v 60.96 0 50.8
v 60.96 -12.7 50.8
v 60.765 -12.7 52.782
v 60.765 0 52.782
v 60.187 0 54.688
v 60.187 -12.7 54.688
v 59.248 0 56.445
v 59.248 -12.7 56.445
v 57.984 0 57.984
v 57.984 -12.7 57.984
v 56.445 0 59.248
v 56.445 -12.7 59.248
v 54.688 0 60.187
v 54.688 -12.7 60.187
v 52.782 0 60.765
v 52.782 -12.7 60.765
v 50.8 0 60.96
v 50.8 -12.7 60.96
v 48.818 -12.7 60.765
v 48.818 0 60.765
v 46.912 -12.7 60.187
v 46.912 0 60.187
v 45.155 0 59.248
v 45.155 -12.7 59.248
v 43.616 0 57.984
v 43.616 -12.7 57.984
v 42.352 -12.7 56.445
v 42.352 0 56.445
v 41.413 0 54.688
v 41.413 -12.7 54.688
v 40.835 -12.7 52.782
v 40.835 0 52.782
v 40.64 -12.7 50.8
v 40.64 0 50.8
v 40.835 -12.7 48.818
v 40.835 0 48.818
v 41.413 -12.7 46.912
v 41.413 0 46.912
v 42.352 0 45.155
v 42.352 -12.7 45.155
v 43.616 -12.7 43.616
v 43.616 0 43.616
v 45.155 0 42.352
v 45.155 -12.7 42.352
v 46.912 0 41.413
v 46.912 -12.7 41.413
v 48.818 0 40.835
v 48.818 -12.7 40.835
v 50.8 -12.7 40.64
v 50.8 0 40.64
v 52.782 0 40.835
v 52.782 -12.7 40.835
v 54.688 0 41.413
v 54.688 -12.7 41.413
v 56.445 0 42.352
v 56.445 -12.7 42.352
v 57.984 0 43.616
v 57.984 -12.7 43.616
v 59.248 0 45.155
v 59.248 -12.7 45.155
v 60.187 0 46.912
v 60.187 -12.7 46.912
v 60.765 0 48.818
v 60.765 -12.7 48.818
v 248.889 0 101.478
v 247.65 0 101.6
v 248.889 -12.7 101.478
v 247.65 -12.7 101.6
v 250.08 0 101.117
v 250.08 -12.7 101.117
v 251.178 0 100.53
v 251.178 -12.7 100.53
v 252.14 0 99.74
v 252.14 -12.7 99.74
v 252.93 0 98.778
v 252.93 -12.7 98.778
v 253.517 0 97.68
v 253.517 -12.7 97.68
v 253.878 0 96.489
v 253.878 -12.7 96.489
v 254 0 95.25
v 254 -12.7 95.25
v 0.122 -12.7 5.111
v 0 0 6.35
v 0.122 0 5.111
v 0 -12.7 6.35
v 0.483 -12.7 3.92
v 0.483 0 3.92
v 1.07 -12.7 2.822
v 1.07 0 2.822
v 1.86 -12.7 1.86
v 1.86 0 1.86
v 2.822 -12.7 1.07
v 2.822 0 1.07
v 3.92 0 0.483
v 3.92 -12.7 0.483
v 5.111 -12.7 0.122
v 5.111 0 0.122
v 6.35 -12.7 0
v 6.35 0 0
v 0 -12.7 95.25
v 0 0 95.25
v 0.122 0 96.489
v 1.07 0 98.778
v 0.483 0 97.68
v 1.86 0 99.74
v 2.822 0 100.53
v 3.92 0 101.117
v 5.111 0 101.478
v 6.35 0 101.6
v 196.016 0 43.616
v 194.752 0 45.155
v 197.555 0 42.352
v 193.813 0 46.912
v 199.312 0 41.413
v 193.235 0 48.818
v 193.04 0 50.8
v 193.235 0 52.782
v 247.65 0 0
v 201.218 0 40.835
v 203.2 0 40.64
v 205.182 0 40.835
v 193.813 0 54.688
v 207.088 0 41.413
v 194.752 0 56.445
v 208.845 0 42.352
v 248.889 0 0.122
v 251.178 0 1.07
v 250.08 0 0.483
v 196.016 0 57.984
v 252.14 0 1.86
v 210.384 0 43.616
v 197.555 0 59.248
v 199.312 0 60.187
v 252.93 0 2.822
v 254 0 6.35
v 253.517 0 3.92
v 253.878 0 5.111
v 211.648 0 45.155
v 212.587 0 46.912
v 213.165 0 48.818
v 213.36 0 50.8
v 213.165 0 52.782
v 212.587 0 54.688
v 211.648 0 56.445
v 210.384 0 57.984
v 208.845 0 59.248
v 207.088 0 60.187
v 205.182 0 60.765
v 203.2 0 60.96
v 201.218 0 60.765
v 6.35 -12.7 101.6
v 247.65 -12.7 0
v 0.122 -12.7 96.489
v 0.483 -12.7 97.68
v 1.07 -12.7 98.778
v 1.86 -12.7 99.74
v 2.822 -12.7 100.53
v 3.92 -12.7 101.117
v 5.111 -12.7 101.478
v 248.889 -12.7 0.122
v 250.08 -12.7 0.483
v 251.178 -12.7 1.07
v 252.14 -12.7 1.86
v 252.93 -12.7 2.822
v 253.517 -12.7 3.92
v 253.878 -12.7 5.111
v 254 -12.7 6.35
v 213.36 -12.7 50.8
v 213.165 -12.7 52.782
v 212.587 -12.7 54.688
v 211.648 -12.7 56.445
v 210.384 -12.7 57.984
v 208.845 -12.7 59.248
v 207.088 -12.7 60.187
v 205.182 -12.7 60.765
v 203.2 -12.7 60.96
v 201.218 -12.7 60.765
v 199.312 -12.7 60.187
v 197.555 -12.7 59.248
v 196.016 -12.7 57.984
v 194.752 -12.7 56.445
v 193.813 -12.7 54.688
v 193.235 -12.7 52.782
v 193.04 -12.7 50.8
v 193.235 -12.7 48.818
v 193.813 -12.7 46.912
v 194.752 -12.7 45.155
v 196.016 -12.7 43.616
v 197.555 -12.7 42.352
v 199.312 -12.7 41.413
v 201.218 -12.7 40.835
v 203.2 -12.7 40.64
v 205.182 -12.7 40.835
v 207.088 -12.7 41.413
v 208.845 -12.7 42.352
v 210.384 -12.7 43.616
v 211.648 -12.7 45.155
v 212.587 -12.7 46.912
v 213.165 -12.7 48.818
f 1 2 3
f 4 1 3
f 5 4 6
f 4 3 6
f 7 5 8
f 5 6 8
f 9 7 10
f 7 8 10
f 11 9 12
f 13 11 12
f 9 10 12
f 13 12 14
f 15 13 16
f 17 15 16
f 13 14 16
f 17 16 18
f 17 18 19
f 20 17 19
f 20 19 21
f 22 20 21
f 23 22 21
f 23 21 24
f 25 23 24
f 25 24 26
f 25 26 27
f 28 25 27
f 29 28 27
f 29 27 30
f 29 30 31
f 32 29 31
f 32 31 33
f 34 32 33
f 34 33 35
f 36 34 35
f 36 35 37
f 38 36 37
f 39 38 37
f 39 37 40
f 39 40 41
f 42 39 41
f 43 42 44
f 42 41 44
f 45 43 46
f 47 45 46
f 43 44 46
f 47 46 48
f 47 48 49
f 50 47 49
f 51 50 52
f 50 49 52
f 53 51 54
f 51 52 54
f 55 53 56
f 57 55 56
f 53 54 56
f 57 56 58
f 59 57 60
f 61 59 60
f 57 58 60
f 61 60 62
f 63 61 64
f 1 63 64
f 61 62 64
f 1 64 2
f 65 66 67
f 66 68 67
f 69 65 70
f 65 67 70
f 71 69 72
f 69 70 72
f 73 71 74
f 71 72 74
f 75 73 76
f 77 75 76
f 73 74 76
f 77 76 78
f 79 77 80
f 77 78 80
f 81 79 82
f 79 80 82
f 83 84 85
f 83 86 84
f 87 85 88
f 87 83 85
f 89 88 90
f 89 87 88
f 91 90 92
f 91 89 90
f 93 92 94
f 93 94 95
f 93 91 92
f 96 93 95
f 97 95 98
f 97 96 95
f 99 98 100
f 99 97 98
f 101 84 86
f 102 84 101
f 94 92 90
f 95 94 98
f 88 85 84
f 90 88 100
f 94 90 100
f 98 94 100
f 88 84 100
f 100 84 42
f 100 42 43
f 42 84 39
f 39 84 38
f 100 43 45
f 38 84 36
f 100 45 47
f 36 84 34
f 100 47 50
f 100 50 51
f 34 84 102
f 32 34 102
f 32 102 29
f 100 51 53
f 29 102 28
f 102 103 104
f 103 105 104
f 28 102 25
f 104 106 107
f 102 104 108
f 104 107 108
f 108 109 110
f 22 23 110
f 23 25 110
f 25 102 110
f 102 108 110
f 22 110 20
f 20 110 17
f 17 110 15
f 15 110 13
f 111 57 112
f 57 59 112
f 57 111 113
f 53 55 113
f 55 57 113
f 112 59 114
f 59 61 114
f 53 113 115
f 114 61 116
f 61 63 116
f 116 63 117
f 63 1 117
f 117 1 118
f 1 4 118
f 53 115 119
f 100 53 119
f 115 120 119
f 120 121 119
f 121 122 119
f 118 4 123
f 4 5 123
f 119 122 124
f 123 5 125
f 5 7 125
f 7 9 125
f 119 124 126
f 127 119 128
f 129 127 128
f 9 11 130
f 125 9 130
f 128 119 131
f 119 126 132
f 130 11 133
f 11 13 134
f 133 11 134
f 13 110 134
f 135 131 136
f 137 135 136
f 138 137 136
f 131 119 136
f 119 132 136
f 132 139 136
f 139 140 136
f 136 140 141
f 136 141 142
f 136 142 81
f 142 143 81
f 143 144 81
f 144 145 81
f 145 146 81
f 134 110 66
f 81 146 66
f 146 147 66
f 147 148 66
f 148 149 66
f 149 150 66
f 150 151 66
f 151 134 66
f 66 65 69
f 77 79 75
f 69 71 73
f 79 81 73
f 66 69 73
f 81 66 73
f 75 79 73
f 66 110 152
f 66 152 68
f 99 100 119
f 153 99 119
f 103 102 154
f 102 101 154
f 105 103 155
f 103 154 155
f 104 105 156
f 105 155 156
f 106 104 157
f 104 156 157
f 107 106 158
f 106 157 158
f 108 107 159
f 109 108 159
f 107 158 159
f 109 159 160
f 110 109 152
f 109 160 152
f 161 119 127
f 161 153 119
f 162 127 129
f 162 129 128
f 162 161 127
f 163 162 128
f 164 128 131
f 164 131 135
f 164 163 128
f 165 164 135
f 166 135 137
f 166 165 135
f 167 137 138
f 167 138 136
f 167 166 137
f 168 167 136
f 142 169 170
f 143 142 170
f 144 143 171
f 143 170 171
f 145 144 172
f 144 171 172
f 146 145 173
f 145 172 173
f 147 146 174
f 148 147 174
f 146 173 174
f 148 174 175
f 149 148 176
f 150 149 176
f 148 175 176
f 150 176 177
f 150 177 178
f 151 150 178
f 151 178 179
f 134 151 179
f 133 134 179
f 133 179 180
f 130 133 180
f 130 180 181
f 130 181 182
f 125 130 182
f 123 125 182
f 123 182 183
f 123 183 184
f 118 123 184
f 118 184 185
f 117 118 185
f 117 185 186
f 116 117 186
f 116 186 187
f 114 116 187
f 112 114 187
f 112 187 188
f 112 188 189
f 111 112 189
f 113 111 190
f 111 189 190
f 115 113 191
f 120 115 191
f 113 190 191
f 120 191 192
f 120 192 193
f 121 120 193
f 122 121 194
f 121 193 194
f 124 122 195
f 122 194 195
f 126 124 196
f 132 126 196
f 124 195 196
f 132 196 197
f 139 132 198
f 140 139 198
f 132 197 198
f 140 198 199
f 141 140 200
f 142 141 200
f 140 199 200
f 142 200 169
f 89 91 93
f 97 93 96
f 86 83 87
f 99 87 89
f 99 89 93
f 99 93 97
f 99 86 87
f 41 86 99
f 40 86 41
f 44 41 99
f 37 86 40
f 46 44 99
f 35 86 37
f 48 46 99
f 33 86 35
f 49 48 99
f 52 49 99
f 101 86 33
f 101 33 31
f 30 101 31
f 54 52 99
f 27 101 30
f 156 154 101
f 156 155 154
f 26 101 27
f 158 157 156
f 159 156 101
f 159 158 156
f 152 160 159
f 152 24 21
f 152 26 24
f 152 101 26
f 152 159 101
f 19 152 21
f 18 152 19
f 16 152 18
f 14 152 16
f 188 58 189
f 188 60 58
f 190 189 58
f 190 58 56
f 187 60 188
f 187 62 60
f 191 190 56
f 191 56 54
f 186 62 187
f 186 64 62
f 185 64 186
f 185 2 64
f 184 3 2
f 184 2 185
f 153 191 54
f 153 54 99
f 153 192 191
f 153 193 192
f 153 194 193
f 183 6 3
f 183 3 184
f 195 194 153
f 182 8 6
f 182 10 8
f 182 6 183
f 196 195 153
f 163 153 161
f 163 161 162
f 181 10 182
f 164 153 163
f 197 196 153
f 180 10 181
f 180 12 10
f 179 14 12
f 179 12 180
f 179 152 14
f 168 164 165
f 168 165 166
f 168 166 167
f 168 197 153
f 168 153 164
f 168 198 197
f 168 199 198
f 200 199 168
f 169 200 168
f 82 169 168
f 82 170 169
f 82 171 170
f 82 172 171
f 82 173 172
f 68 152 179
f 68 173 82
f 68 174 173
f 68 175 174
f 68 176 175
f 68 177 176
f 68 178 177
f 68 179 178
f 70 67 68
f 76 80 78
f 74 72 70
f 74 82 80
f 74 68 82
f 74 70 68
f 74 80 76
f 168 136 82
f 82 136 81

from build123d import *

# Parameters (mm, degrees)
F0_W     = 254
F0_H     = 101.6
F1_DEPTH = 12.7
F2_R     = 10.16
F3_DEPTH = 25.4
F4_R     = 6.35


with BuildPart() as f1:
    # F0 (on Front) → F1 (new body)
    with BuildSketch(Plane.XZ):
        with Locations((127, 50.8)):
            Rectangle(F0_W, F0_H)
    extrude(amount=F1_DEPTH)

    # F2 (on face) → F3 (cut)
    with BuildSketch(Plane.XZ.offset(12.7)):
        with Locations((50.8, 50.8)):
            Circle(F2_R)
        with Locations((203.2, 50.8)):
            Circle(F2_R)
    extrude(amount=-F3_DEPTH, mode=Mode.SUBTRACT)

    # F4
    f4_edges = [f1.edges().sort_by_distance(p)[0] for p in [
        (0, -6.35, 101.6),
        (254, -6.35, 101.6),
        (254, -6.35, 0),
        (0, -6.35, 0),
    ]]
    fillet(f4_edges, radius=F4_R)


solid = f1.part
